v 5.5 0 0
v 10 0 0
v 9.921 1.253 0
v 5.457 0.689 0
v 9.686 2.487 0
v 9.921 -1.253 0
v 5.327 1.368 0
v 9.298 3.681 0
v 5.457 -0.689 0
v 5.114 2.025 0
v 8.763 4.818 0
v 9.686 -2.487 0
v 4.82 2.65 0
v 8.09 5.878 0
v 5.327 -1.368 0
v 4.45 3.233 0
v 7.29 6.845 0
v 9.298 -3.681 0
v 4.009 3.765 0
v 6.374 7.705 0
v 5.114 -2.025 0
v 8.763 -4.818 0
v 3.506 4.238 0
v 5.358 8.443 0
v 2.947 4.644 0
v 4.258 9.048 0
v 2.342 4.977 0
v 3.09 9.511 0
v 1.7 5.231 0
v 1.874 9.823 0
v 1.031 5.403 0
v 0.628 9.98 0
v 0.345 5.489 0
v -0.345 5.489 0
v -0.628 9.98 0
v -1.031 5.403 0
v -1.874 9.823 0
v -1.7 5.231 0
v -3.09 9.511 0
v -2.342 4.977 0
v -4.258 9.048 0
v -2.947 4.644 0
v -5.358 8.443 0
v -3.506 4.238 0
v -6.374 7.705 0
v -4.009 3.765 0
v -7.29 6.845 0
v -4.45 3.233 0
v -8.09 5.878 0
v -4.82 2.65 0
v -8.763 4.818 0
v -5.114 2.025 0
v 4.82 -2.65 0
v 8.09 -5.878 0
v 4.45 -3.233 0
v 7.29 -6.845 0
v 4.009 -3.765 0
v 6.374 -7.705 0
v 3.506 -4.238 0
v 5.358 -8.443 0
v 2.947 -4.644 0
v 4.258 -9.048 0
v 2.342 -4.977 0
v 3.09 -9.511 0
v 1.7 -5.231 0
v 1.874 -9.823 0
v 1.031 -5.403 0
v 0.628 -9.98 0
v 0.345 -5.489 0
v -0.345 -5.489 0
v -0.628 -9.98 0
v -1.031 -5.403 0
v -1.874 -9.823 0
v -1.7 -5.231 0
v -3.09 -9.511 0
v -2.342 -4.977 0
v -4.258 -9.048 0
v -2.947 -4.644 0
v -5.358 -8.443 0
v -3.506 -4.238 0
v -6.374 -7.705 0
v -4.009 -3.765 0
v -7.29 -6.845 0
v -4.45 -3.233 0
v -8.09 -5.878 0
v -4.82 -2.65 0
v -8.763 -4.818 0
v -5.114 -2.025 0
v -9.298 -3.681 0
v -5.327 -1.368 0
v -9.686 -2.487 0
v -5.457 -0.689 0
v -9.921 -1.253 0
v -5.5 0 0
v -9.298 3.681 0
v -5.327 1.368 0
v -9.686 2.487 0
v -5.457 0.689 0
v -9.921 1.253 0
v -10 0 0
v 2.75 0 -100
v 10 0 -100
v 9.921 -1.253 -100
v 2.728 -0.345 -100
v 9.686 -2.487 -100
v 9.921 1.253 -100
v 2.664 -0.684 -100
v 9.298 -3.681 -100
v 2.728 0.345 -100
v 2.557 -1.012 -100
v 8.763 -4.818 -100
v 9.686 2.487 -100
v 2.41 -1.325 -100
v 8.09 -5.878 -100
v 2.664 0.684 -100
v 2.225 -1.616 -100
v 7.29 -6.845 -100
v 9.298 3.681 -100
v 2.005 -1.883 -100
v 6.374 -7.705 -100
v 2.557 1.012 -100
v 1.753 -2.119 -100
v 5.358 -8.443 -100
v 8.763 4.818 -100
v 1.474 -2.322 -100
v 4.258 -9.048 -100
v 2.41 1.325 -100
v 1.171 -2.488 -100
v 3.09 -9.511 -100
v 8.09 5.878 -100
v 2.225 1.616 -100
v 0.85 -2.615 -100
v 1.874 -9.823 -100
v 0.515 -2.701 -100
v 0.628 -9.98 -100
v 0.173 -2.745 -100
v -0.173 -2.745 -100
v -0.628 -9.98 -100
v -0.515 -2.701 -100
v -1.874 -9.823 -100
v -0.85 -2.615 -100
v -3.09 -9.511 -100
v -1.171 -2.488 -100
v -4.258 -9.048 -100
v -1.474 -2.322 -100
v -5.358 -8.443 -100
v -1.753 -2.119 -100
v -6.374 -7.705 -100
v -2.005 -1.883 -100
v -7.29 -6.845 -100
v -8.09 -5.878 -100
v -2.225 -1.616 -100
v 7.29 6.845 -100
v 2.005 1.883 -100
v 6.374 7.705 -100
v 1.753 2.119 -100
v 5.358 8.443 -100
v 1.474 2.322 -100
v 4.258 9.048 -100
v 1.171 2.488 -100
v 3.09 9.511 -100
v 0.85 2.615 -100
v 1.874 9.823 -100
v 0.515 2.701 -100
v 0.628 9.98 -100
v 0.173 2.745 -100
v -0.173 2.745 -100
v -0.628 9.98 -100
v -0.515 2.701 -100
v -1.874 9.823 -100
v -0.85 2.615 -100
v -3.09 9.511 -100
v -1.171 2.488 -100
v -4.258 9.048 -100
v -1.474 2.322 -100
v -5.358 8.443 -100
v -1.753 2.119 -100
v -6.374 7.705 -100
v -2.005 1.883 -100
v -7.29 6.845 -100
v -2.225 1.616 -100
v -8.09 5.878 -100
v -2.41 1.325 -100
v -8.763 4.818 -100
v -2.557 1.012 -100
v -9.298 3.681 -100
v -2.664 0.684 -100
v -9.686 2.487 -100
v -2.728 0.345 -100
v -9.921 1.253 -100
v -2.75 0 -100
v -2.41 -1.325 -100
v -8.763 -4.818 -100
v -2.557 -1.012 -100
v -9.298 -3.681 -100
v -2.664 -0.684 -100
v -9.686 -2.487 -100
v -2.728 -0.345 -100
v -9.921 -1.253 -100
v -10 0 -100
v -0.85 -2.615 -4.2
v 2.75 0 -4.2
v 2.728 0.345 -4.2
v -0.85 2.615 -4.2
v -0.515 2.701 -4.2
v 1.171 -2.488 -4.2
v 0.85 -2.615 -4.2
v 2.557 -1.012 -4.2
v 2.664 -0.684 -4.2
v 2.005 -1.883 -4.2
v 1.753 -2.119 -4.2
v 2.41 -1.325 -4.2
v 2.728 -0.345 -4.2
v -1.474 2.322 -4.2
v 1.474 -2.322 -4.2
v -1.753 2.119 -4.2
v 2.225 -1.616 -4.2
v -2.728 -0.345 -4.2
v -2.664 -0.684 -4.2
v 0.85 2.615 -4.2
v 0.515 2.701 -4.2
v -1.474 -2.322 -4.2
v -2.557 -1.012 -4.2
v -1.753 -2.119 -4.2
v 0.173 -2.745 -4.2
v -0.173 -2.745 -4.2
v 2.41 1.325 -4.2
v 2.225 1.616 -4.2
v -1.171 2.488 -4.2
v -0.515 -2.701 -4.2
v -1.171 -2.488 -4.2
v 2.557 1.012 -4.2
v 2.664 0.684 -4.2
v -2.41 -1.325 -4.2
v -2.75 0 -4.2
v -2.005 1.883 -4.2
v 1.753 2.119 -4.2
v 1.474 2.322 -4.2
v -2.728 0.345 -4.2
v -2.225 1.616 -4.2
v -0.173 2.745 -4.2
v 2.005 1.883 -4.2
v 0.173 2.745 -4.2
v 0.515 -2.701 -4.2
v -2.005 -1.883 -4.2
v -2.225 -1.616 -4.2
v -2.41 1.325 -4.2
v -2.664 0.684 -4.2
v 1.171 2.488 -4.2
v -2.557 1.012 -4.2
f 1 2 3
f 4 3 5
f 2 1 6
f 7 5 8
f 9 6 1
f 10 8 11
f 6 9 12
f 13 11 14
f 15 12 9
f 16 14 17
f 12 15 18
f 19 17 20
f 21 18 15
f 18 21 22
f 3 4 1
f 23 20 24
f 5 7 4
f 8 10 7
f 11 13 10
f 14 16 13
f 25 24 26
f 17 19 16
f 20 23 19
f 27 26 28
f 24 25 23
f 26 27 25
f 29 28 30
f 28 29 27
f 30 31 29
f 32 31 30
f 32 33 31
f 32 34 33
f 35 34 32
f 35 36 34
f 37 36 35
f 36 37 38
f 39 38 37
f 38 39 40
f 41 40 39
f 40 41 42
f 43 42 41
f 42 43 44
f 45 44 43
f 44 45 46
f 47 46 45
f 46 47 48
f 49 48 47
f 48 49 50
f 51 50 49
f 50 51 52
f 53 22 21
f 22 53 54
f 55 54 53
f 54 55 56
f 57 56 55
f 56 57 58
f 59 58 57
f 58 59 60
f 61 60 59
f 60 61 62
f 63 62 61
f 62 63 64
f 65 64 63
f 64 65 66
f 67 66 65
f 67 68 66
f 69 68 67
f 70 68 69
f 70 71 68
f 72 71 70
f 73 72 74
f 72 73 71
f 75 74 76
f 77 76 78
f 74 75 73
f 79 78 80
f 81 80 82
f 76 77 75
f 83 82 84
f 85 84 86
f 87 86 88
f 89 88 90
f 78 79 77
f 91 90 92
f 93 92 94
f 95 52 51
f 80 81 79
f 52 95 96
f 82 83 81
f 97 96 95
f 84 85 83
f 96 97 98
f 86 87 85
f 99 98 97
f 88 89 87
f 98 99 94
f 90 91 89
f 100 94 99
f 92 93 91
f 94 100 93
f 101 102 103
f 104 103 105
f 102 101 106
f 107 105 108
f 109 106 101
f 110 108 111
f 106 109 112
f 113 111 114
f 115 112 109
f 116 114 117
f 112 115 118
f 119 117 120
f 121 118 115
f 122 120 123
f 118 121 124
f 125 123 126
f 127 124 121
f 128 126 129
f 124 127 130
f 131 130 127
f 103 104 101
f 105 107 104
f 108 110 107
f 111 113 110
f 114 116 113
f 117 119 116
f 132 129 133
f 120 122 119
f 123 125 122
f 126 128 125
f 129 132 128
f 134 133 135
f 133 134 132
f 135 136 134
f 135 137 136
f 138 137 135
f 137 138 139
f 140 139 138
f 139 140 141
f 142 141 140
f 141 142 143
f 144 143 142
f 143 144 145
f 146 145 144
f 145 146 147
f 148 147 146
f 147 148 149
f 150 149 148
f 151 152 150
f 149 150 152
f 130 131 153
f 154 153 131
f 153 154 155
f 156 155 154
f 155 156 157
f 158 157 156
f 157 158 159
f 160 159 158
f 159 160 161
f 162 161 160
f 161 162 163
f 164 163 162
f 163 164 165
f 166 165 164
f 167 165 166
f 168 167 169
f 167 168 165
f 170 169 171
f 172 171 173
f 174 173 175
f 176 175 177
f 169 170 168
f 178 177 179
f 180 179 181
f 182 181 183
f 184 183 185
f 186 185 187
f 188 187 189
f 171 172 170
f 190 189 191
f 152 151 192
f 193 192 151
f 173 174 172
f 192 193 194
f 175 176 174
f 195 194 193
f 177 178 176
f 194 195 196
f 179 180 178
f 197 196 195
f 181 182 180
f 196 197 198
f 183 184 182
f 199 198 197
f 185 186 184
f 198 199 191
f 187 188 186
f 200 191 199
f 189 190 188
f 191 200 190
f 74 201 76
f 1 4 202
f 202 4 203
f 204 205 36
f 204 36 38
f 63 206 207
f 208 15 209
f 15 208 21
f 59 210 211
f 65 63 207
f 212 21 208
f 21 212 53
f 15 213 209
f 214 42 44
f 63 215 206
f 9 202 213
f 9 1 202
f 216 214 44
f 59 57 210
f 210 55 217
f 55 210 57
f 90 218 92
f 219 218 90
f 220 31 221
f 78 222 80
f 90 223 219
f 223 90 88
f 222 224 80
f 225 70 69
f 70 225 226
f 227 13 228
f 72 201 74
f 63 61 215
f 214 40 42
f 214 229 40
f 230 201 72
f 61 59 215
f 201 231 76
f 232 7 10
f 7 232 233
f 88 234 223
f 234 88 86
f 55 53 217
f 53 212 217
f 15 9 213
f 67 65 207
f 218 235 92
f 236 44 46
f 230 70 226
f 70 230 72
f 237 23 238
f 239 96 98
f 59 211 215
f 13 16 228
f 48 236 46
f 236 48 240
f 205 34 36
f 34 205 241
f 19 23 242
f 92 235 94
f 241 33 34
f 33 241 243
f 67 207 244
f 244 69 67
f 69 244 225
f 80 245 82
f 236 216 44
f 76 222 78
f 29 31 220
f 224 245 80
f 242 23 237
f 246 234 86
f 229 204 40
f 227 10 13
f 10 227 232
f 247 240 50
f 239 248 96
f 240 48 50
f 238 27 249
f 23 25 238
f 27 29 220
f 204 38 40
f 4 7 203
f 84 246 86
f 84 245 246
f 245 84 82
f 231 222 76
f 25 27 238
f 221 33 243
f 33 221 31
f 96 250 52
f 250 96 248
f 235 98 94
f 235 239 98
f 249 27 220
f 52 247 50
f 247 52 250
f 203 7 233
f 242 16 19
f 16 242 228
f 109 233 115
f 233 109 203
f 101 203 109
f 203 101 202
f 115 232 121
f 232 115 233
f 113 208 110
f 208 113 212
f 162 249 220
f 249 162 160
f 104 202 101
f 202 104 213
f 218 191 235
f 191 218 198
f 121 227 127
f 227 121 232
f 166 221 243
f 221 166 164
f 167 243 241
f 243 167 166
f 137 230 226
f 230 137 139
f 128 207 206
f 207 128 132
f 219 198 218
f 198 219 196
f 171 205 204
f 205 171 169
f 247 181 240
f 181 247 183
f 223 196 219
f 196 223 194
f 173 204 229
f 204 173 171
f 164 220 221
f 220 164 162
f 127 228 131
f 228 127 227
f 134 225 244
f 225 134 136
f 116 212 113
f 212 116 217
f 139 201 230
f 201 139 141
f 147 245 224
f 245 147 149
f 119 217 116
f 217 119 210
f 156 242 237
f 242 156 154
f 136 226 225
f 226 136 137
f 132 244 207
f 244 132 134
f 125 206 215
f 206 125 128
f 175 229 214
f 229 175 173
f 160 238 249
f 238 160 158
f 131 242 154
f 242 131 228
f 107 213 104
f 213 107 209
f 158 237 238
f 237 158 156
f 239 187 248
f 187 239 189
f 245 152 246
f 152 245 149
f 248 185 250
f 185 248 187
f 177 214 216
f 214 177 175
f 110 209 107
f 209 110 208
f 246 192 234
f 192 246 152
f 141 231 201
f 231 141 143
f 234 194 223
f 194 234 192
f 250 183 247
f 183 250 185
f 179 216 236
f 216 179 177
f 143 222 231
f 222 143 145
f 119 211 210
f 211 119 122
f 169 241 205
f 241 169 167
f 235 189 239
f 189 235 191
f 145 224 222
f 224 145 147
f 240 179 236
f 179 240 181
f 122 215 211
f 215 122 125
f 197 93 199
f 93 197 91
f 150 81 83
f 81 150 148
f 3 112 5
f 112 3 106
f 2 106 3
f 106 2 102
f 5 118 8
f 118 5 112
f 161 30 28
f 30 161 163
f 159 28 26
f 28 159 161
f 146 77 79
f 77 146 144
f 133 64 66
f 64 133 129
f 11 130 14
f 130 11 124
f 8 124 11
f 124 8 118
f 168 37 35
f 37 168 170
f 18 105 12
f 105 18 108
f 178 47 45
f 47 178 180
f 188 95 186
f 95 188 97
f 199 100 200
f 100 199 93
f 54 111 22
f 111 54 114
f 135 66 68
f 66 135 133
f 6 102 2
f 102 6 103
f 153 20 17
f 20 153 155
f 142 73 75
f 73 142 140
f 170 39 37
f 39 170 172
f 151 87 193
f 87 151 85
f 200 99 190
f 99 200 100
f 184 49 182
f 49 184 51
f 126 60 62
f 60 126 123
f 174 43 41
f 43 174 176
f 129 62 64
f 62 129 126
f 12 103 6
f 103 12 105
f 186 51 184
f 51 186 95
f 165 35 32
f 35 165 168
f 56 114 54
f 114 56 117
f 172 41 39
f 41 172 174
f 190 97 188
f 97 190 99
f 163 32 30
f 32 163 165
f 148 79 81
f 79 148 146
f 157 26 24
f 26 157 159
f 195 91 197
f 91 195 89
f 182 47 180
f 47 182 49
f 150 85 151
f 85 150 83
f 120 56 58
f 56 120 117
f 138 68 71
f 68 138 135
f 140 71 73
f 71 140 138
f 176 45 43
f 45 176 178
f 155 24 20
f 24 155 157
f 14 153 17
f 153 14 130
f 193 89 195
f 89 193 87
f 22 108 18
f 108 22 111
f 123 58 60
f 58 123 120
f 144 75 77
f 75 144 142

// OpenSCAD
$fn = 50;


difference() {
	union() {
		translate(v = [0, 0, -100.0000000000]) {
			cylinder(h = 100, r = 10.0000000000);
		}
	}
	union() {
		translate(v = [0, 0, 0]) {
			rotate(a = [0, 0, 0]) {
				difference() {
					union() {
						#translate(v = [0, 0, -100.0000000000]) {
							cylinder(h = 100, r = 2.2500000000);
						}
						#translate(v = [0, 0, -4.2000000000]) {
							cylinder(h = 4.2000000000, r = 10.0000000000, r1 = 2.7500000000, r2 = 5.5000000000);
						}
						#translate(v = [0, 0, -100.0000000000]) {
							cylinder(h = 100, r = 2.7500000000);
						}
						#translate(v = [0, 0, -100.0000000000]) {
							cylinder(h = 100, r = 2.2500000000);
						}
					}
					union();
				}
			}
		}
	}
}
